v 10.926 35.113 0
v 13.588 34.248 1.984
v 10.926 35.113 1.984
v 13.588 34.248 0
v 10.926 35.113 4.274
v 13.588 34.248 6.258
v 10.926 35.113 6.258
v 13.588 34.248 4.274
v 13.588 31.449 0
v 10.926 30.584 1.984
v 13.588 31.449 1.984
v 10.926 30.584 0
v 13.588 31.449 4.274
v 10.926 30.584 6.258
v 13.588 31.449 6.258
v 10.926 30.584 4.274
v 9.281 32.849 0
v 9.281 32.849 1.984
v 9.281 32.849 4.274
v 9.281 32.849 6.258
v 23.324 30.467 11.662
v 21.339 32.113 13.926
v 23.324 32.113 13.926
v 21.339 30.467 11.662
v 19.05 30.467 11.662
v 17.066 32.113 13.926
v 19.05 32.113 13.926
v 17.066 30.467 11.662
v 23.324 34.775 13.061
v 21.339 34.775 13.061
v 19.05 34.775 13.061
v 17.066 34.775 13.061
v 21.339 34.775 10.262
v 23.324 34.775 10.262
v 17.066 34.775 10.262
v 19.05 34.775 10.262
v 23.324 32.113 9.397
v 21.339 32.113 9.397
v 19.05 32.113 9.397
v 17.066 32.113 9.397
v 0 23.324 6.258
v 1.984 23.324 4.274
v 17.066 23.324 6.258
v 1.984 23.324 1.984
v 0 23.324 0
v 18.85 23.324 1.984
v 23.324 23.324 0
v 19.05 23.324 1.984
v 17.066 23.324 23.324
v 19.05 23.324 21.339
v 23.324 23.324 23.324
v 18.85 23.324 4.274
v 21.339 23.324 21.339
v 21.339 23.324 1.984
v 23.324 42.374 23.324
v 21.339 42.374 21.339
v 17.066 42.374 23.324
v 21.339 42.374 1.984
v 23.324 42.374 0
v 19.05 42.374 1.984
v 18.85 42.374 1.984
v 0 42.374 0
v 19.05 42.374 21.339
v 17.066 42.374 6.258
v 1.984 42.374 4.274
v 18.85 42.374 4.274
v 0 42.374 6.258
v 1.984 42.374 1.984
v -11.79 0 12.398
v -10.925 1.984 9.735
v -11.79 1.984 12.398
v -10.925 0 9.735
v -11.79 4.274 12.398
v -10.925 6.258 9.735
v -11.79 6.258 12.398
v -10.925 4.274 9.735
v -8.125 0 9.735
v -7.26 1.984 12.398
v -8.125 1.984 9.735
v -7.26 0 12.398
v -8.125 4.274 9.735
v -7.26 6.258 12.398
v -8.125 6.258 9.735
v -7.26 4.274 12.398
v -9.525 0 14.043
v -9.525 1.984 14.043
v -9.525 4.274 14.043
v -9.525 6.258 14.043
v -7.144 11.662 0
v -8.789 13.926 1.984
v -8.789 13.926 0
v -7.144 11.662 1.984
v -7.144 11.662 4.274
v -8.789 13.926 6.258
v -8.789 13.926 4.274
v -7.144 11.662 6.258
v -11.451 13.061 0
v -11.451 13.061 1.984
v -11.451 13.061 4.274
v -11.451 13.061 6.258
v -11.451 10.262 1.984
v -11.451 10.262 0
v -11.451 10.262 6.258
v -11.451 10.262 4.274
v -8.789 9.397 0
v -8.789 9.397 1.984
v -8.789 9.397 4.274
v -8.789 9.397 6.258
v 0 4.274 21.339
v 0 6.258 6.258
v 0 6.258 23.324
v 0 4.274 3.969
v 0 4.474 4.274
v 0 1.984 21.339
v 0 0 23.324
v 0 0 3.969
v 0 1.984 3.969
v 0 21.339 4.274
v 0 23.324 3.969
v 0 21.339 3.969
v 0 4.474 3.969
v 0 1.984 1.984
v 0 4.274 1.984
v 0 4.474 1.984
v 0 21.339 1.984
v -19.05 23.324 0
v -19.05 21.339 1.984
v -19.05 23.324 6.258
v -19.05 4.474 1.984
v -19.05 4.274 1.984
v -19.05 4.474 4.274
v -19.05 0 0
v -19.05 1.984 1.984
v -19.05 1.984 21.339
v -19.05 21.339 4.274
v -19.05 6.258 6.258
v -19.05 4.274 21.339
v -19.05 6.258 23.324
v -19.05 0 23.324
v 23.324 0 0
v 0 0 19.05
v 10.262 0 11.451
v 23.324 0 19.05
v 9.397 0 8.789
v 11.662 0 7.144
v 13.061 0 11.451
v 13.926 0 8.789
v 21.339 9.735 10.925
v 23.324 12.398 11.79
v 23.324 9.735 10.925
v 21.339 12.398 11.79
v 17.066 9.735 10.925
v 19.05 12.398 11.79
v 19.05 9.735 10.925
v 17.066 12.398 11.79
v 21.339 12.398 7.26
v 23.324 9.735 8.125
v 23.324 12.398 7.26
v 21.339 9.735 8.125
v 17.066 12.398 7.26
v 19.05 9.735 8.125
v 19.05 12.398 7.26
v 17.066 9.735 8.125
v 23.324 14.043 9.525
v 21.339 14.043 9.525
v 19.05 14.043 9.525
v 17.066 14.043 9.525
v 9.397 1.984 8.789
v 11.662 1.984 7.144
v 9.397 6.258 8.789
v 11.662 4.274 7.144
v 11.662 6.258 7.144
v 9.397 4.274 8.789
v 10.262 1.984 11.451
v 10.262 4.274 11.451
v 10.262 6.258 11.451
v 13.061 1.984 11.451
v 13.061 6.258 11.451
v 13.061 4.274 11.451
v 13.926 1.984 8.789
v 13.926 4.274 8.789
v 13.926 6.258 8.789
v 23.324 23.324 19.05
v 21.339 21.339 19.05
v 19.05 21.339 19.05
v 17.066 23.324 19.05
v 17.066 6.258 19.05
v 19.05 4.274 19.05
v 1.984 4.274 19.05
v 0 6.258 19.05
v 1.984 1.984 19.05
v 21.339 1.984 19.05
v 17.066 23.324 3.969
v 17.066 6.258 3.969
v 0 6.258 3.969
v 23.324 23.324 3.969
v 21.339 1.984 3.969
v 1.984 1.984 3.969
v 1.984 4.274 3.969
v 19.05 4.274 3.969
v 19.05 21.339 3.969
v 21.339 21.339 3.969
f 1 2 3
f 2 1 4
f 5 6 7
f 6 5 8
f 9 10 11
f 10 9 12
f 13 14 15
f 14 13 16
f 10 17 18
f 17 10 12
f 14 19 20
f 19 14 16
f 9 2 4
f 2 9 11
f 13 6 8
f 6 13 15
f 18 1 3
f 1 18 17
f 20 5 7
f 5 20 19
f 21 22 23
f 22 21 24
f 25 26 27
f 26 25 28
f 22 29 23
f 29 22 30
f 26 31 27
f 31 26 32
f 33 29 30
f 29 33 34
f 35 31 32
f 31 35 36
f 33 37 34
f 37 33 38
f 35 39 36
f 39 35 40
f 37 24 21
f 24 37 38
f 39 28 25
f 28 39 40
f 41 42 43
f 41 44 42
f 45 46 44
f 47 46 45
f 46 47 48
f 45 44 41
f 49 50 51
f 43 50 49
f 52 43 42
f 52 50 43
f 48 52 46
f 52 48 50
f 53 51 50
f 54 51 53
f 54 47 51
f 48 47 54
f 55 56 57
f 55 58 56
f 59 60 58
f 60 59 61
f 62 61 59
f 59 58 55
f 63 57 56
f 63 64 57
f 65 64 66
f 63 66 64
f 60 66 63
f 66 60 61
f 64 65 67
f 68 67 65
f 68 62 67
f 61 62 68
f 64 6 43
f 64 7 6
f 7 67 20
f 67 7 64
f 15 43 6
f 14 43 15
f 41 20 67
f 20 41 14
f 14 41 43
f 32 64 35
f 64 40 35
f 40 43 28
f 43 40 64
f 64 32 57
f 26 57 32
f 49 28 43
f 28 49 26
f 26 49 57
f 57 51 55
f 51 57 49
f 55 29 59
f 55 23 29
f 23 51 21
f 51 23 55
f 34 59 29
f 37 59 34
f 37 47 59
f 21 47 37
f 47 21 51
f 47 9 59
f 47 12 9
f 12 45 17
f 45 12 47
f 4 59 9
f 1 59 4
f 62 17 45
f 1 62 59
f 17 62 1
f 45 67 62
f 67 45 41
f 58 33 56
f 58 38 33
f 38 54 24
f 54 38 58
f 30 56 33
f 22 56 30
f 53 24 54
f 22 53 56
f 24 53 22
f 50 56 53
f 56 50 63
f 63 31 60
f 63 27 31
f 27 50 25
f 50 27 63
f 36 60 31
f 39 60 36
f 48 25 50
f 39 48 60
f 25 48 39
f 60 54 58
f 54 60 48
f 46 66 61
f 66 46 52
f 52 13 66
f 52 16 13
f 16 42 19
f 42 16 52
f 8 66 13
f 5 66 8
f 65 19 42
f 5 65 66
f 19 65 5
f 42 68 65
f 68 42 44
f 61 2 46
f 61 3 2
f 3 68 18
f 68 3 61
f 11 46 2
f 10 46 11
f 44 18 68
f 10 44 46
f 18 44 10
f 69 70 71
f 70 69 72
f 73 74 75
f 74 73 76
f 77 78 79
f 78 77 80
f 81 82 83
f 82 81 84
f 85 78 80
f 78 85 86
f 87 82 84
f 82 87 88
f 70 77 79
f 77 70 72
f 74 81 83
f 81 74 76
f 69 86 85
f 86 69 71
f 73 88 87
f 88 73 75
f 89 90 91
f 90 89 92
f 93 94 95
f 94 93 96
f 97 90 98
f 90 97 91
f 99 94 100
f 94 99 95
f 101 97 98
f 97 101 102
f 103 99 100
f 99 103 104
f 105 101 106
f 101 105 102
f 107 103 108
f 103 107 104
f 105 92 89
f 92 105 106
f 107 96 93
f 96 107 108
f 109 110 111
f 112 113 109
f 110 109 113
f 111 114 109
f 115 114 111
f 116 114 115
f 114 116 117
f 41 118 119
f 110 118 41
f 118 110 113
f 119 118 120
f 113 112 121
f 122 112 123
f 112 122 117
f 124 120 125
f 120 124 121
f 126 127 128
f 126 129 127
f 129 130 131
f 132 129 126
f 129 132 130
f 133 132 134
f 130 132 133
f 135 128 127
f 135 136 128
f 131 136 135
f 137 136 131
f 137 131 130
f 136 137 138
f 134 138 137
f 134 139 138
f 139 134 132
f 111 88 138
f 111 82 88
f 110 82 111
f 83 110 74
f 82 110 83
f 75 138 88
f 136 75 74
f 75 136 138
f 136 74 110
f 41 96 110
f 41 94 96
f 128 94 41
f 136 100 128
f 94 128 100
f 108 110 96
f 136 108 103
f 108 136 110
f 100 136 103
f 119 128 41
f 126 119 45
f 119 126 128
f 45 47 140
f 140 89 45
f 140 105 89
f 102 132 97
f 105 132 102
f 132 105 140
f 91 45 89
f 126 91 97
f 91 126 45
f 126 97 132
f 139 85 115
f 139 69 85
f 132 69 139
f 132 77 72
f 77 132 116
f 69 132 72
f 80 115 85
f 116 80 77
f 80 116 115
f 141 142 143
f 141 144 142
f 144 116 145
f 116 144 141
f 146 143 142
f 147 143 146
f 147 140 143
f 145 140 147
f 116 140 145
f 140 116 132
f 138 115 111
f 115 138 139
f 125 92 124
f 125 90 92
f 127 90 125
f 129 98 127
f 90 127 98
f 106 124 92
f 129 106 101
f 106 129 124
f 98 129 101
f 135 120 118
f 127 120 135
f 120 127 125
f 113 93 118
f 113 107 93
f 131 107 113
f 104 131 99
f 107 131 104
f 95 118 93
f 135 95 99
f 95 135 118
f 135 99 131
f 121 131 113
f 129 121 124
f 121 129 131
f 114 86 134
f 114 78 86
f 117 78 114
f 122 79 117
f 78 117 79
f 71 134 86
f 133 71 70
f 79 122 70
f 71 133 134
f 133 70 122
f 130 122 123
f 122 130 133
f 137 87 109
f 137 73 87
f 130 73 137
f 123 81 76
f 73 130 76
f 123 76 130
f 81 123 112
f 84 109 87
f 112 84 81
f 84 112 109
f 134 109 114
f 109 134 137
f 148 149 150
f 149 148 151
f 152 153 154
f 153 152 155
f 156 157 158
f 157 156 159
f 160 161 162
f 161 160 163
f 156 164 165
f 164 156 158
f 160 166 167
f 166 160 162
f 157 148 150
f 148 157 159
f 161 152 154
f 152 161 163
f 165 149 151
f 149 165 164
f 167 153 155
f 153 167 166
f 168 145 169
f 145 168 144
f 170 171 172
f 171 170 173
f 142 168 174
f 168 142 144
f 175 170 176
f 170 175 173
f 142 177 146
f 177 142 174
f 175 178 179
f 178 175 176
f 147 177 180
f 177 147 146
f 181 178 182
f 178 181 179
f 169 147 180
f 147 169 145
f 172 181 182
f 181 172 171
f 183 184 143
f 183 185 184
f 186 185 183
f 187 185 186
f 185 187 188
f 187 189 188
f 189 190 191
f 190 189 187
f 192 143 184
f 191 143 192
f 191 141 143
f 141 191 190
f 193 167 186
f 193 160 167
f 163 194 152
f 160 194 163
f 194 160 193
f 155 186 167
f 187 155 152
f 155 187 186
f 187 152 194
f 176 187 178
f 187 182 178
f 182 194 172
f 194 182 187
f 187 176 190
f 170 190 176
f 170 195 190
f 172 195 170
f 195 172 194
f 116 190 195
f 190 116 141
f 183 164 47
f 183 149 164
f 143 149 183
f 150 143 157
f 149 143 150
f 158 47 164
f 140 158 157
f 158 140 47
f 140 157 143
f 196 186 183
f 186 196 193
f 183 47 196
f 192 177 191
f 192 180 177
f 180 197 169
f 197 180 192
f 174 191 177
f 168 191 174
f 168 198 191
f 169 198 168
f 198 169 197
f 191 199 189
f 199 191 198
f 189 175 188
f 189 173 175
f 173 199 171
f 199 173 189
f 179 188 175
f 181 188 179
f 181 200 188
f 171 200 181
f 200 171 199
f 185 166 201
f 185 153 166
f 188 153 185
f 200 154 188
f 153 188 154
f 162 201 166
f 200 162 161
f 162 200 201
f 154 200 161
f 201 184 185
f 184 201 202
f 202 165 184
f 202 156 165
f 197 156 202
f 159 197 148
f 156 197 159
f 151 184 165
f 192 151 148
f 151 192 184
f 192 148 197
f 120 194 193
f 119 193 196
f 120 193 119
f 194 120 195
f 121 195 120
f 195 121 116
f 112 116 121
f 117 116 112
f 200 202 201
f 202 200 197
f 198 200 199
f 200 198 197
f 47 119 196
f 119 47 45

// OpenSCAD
// 5/64ths
// 3/4
// 3/4

// Which part to print
part = "corner"; // [corner:Corner, beamRest:Beam rest]

// How round should the holes be?
ROUNDNESS=5; //[0:50]

units = "in"; //[in:Inches, mm:mm]

conversion = (units=="in")?25.4:1;


// This is the size of each of the legs of the beam
beamWidth = .75;

// This is the thickness of the beam (5/64)
thicknessOfBeam = 0.078125;

// how thick should the walls be? (5/64)
wallThickness = 0.078125;

// spacing between parts
printerTolerance = .006;

beamThickness = thicknessOfBeam * conversion;
beamSize = beamWidth * conversion;
// sorry, mm only
tolerance = printerTolerance * conversion;

thickness = wallThickness * conversion;

// depth of the pieces
pieceDepth = .75;
depth = pieceDepth * conversion;

// radius of the hole
holeSize = 0.09375;
holeRad = holeSize * conversion;

// The amount of overhang on the beam rest
overhang = 1;

module connector(connectorDepth = depth, support1 = false, support2 = false)
{
    difference(){
        linear_extrude(connectorDepth)
        {
                polygon(points=[[0,0], [beamSize + 2*(tolerance + thickness), 0],
            [beamSize + 2 * (tolerance + thickness), beamThickness + 2* (thickness + tolerance)],
            [2*(tolerance + thickness) + beamThickness, beamThickness + 2* (thickness + tolerance)],
            [2*(tolerance + thickness) + beamThickness, 2*(tolerance + thickness) + beamSize],
            [0,2*(tolerance + thickness) + beamSize],
            
            [thickness, thickness], [thickness + beamSize + 2 * tolerance, thickness],
            [thickness + beamSize + 2 * tolerance, thickness + 2 * tolerance + beamThickness],
            [thickness + 2 * tolerance + beamThickness, thickness + 2 * tolerance + beamThickness],
            [thickness + 2 * tolerance + beamThickness, 2 * tolerance + beamSize + thickness],
            [thickness, 2 * tolerance + beamSize + thickness]], paths=[[0,1,2,3,4,5], [6,7,8,9,10,11]]);
            
            if(support1)
            {
                translate([thickness + 2 * tolerance + beamThickness, thickness-.5, 0])
                    square(size=[.2, beamThickness+2*tolerance+1]);
                //translate([2*(thickness + tolerance) + beamThickness, thickness-.5, 0])
                 //   square(size=[.2, beamThickness+2*tolerance+1]);
            }
            if(support2)
            {
                translate([thickness-.5, thickness + 2 * tolerance + beamThickness, 0])
                    square(size=[beamThickness+2*tolerance+1, .2]);
                //translate([thickness-.5, 2 * (thickness + tolerance) + beamThickness, 0])
                //    square(size=[beamThickness+2*tolerance+1, .2]);
            }
        }
            
        if(holeRad > 0)
        {
            // holes
            translate([(beamSize + 2 * (tolerance + thickness))/2,-.5,connectorDepth/2])
                rotate([-90,0,0])cylinder(h=beamThickness + 2* (thickness + tolerance)+1, r=holeRad, $fn=ROUNDNESS);
                    
            translate([-.5,(beamSize + 2 * (tolerance + thickness))/2,connectorDepth/2])
                rotate([0,90,0])cylinder(h=beamThickness + 2* (thickness + tolerance)+1, r=holeRad, $fn=ROUNDNESS);
        }
    }
}
module angleBracket()
{
    cubeSize = beamSize + 2 * (tolerance+thickness);
translate([cubeSize,cubeSize,0])rotate([90,0,180])connector(support1 = true);
translate([0,0,0])rotate([0,-90,0])connector(support2 = true);
translate([cubeSize,0,0])rotate([0,0,90])connector();
    cube(size=[cubeSize, cubeSize, 2*thickness]);
}



module beamRest(length = 25)
{
    // sqrt(a * a + a * a) = sqrt(2) * a
    width = sqrt(2)*(depth+2*(thickness + tolerance));
    
    connector(connectorDepth=width);
    translate([beamSize + thickness + 2*tolerance,0,0]){
        cube(size=[length,2*(thickness+tolerance) + beamThickness, width]);
    }
    translate([beamSize + thickness+tolerance, -2*thickness, 0])
        cube(size=[length, 3*thickness, thickness]);
    
    translate([beamSize + thickness+tolerance, -2*thickness, width -thickness ])
        cube(size=[length, 3*thickness, thickness]);
    
    //crossbeam
    translate([beamSize + thickness+tolerance, -2*thickness, 0])
        cube(size=[thickness, thickness, width]);
}

module ring(id, od, depth)
{
    difference()
    {
        cylinder(r=od, h=depth, $fn=ROUNDNESS);
        translate([0,0,-1])cylinder(r=id, h=depth+2, $fn=ROUNDNESS);
    }
}

if(part == "beamRest")
{
    beamRest(length = overhang * conversion);
}

if(part == "corner" || pieceToPrint == "all")
{
    angleBracket();
}



